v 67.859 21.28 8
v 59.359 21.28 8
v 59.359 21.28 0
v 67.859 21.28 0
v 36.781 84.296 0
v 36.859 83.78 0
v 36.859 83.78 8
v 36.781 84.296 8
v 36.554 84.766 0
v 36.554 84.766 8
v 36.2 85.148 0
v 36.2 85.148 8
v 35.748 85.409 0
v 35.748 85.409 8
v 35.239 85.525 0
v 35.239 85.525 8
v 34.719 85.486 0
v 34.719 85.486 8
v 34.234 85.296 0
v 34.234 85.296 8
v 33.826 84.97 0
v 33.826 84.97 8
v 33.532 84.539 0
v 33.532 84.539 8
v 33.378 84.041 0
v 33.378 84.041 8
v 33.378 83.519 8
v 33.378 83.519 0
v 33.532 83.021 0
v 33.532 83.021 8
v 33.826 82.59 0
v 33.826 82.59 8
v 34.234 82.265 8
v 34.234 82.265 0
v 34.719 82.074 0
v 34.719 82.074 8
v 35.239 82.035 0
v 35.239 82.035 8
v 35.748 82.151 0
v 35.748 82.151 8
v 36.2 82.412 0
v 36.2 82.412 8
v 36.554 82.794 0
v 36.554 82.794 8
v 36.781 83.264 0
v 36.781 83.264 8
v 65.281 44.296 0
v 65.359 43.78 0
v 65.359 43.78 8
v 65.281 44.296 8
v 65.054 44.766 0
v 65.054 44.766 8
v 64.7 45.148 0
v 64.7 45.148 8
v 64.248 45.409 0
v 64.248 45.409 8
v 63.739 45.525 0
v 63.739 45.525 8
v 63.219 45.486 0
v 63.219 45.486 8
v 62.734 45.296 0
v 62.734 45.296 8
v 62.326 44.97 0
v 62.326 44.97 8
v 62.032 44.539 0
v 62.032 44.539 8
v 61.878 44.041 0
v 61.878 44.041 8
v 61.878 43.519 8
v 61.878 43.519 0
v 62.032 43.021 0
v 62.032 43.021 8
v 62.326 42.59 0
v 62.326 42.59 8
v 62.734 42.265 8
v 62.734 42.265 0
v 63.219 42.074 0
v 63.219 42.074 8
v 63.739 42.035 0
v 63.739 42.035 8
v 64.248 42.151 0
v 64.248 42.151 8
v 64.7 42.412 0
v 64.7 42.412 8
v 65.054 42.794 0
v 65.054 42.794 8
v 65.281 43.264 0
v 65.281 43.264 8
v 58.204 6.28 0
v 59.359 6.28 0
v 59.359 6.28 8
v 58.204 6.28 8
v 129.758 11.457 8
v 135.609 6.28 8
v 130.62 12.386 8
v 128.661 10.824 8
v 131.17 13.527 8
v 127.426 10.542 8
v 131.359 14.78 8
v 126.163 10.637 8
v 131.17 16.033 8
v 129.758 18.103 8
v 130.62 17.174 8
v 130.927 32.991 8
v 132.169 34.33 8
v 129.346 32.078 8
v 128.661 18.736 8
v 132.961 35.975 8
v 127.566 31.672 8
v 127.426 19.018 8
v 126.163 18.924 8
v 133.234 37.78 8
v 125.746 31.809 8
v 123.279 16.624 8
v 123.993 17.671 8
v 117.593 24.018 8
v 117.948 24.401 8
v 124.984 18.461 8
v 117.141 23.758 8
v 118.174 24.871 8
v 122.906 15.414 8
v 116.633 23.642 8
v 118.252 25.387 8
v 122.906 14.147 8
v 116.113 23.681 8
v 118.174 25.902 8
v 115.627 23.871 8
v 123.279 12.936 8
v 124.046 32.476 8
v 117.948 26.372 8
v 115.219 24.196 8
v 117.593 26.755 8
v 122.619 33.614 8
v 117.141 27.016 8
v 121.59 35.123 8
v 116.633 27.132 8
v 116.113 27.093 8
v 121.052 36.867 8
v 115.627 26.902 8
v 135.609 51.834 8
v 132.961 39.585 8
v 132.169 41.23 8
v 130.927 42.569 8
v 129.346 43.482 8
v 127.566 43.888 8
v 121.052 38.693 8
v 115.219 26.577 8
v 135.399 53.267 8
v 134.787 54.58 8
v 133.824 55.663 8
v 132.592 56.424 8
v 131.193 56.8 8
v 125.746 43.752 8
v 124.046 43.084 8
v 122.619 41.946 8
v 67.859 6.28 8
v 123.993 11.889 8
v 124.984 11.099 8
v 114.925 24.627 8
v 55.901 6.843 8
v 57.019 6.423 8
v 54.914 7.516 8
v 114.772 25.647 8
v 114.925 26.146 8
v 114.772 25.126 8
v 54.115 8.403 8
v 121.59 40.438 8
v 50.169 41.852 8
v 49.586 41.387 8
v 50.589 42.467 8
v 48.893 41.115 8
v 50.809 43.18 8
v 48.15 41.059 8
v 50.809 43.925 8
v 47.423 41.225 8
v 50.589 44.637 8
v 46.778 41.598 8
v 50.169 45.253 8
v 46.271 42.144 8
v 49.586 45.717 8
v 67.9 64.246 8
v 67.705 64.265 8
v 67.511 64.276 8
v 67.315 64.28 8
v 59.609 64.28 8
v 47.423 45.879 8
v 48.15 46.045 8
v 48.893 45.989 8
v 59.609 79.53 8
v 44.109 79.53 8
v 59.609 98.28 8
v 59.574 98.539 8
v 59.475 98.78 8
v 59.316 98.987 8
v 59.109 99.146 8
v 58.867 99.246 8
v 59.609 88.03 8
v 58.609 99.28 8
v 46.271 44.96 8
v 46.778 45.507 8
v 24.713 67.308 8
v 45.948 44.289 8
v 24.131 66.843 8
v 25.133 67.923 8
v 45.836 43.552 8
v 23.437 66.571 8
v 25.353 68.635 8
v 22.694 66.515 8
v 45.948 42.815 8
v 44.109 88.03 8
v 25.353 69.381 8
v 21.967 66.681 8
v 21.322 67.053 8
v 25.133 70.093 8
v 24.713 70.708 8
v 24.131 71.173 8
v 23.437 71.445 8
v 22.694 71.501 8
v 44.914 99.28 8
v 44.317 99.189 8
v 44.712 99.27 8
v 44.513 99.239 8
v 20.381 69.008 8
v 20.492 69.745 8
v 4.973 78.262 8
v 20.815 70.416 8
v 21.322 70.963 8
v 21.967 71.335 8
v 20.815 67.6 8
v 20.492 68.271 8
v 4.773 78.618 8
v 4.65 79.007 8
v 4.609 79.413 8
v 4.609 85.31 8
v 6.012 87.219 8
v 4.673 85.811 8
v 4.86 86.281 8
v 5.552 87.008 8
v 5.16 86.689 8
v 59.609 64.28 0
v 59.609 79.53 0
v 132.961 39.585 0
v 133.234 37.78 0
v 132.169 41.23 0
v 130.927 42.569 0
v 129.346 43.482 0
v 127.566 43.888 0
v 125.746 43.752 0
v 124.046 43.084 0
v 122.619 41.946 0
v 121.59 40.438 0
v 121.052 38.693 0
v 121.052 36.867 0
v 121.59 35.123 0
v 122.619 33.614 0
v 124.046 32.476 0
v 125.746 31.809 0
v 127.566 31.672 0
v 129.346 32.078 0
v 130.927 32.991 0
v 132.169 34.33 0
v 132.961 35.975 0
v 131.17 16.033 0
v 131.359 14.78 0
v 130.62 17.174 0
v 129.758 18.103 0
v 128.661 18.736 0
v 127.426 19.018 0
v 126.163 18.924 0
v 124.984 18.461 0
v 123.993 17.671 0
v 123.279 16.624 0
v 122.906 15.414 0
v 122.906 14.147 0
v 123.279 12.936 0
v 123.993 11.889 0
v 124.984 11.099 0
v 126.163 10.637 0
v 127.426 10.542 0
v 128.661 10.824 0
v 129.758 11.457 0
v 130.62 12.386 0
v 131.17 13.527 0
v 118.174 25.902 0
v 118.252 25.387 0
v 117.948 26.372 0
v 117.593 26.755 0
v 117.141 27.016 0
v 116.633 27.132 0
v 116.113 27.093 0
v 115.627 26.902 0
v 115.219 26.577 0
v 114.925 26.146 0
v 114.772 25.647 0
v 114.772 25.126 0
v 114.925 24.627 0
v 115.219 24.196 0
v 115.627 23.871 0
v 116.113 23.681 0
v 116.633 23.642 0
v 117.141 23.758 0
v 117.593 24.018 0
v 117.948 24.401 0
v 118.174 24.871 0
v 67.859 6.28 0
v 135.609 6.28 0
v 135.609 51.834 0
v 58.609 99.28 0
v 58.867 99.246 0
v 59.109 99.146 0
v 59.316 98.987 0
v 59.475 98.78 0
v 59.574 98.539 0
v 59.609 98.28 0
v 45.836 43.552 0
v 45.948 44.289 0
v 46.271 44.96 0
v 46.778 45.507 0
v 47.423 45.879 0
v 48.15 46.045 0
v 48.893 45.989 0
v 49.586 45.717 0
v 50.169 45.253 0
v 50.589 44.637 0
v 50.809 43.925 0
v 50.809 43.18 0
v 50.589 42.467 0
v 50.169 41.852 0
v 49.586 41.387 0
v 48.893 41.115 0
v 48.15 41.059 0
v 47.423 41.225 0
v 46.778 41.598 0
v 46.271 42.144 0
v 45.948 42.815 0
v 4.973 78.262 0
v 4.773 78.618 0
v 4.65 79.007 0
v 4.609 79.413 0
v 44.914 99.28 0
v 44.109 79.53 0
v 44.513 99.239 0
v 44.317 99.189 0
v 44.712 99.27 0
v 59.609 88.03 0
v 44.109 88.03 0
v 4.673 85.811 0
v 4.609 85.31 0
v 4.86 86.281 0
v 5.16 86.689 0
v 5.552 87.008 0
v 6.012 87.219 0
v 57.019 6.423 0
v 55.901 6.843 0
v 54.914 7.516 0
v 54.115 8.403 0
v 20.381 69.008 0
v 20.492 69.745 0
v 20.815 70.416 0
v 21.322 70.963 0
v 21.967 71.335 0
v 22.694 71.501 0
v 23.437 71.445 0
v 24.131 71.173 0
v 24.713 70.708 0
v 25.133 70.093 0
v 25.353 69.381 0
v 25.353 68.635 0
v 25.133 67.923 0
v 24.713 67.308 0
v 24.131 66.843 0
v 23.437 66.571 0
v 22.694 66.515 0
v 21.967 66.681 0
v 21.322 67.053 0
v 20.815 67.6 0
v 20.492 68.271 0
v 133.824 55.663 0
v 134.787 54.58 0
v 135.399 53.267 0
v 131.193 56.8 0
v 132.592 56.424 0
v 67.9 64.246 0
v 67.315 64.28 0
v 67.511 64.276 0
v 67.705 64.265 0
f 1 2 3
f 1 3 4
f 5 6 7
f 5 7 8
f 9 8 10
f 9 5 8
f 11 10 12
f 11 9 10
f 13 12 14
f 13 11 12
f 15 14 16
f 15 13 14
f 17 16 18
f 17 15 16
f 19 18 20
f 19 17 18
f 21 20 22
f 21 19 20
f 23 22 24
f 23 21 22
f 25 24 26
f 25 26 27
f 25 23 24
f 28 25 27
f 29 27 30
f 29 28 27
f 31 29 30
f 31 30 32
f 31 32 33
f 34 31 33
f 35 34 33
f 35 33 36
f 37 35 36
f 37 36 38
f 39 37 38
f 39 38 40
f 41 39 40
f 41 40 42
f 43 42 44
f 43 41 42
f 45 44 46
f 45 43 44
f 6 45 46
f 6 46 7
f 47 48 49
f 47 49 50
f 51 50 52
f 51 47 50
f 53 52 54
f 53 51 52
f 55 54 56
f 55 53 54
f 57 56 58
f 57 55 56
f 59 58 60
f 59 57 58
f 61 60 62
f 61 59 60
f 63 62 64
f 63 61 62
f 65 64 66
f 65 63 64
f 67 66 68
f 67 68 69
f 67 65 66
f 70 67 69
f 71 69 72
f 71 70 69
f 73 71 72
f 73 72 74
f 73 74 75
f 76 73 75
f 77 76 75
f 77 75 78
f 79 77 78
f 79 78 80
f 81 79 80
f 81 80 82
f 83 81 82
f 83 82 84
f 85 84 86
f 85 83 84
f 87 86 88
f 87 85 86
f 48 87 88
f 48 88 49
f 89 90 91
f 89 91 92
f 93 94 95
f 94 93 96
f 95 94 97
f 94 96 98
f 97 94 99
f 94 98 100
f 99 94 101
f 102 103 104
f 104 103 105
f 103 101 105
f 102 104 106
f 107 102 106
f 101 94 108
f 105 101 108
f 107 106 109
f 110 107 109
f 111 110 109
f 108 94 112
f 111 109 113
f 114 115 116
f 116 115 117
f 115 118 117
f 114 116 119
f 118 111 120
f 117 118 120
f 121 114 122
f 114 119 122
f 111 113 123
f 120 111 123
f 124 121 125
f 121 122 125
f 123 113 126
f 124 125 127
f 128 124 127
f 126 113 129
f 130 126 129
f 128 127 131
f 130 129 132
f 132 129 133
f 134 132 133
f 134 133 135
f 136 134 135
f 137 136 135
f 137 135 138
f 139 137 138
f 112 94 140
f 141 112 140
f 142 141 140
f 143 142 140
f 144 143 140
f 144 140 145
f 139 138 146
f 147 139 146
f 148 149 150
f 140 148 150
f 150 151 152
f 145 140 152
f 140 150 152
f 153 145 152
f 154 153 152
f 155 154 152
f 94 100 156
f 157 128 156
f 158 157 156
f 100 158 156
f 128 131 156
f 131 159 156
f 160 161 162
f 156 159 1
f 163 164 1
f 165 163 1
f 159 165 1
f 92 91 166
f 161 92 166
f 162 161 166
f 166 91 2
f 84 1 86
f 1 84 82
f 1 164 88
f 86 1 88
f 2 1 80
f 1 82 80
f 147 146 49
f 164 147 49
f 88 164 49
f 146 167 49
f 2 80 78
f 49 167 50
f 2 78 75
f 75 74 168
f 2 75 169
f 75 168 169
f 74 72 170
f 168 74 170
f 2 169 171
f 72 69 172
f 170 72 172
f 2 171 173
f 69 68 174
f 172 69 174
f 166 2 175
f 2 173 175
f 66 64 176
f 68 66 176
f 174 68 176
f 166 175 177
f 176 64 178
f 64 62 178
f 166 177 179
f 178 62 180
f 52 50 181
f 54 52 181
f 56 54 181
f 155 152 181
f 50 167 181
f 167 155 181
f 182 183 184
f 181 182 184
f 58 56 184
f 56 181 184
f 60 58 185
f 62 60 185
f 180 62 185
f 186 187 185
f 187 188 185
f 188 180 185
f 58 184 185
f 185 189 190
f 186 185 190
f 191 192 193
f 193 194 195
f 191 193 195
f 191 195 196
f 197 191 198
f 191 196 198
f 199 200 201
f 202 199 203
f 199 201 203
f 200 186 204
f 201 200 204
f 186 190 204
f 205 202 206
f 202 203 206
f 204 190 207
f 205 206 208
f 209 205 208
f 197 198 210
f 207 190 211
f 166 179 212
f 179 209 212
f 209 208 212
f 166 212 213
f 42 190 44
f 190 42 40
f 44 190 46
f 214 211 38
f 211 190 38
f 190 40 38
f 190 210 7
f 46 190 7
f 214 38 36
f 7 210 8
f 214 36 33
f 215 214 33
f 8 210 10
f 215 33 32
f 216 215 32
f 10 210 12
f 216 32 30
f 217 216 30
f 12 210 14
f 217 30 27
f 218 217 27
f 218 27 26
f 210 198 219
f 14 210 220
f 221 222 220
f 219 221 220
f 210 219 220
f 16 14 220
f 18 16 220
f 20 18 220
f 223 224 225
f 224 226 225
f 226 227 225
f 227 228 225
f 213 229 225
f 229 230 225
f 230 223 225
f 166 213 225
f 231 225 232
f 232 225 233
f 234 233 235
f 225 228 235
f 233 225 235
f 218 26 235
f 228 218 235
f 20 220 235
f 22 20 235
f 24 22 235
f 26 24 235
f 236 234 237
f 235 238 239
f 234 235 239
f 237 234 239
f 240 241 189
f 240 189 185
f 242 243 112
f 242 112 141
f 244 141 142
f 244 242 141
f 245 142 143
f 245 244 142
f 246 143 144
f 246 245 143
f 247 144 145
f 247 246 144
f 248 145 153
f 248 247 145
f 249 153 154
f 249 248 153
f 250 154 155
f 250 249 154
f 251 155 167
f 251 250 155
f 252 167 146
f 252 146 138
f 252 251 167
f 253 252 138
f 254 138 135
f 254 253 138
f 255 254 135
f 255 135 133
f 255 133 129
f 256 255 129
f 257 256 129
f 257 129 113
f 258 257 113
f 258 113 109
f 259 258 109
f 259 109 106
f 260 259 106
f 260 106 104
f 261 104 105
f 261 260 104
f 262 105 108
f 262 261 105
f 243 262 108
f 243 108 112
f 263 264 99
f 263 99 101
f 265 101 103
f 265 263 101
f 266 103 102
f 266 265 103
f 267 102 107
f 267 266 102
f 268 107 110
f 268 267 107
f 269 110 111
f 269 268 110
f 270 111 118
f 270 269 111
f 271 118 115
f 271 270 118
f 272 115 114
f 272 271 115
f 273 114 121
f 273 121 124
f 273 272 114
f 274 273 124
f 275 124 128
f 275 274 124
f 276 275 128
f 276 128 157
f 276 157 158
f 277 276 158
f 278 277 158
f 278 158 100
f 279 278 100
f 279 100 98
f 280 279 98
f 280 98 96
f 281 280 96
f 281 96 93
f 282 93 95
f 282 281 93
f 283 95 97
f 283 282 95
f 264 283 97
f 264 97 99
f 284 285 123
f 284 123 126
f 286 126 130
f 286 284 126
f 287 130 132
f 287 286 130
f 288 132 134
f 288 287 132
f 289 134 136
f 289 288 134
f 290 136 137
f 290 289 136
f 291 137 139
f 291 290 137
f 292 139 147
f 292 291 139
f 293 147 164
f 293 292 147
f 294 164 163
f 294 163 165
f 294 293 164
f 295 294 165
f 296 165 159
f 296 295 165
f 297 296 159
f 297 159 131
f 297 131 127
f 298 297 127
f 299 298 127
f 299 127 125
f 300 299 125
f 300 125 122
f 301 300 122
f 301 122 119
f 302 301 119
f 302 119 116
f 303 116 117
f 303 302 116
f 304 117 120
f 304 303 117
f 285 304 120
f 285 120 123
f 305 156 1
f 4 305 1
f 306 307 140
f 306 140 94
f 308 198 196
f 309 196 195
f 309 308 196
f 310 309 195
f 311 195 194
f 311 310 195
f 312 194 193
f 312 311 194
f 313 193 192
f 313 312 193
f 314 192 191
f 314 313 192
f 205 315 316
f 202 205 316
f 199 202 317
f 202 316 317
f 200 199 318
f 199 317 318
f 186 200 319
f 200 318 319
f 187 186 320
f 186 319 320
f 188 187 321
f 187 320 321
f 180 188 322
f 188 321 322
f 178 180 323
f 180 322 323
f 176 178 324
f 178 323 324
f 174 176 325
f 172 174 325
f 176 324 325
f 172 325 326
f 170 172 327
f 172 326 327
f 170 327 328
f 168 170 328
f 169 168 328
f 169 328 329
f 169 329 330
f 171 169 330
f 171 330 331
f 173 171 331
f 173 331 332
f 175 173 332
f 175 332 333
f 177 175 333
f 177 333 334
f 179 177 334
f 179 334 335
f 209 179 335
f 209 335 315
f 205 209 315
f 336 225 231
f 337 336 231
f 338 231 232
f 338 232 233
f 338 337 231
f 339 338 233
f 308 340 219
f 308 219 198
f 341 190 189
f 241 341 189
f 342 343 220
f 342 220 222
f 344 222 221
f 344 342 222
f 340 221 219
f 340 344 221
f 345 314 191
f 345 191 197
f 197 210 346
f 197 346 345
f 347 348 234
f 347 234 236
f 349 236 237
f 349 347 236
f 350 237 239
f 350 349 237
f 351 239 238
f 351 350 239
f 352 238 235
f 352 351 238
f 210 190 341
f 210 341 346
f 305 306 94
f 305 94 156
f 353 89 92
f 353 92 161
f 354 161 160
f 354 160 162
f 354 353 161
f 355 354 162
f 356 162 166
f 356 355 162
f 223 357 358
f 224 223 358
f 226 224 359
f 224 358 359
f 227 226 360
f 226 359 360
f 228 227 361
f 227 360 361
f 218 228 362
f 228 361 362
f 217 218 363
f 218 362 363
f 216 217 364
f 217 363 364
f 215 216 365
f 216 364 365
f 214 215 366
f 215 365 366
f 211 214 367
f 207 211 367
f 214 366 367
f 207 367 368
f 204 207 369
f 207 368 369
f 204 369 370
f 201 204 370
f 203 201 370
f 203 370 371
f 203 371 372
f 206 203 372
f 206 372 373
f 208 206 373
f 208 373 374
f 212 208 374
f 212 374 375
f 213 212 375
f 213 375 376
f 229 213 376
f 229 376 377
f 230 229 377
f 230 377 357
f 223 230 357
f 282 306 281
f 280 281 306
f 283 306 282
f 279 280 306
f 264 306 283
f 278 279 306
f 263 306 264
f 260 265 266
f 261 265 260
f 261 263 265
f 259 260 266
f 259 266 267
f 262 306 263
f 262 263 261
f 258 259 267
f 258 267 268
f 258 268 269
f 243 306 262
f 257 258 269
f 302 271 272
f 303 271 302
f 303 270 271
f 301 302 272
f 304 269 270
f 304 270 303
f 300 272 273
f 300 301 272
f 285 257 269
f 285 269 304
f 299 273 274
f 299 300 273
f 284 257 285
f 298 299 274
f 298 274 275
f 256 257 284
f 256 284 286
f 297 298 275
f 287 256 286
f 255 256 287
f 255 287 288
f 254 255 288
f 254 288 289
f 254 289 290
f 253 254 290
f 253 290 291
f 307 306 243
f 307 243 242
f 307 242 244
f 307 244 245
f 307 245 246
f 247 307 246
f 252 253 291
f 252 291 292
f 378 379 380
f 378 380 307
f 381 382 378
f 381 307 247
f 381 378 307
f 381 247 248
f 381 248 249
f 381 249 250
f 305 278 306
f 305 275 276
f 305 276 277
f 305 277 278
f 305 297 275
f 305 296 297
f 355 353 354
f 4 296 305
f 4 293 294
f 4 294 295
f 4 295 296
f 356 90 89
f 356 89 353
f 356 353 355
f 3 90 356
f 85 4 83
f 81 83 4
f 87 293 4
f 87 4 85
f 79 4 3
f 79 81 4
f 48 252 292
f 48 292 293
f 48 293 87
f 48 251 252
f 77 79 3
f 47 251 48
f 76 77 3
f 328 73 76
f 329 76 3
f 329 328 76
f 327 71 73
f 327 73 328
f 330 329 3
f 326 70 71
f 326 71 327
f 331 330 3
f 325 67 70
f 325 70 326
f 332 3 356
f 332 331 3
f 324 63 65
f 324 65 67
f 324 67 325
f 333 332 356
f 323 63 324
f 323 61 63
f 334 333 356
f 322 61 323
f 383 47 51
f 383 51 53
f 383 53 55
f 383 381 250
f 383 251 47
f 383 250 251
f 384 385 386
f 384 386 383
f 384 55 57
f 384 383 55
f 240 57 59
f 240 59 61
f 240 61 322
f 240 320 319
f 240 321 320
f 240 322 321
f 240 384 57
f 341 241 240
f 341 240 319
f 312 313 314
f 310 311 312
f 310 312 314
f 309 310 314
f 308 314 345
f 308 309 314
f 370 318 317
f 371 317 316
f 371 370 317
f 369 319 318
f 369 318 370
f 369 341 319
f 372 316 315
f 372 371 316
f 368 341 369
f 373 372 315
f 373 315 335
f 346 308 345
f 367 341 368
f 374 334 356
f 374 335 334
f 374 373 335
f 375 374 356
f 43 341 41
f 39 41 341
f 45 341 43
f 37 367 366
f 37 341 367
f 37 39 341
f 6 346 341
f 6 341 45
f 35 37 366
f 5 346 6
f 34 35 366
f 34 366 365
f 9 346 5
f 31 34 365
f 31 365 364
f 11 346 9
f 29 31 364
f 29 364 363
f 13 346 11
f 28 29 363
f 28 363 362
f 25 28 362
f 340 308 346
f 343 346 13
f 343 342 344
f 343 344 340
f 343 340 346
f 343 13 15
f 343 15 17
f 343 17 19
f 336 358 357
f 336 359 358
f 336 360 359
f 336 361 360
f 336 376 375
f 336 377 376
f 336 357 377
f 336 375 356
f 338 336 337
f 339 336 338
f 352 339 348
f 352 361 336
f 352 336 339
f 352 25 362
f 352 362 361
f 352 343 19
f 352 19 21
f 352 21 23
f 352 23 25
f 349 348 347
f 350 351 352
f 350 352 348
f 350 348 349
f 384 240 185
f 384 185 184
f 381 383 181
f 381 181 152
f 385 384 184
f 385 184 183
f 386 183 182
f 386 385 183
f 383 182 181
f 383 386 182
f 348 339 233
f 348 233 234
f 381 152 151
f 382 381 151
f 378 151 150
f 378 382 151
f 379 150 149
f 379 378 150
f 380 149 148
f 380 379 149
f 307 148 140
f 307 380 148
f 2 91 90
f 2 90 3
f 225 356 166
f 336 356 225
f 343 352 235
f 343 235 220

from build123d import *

# Parameters (mm, degrees)
SKETCH2_R          = 6.125
SKETCH2_R_2        = 4.25
SKETCH2_R_3        = 1.75
EXTRUDE1_DEPTH     = 8
SKETCH3_W          = 8.5
SKETCH3_H          = 15
SKETCH3_W_2        = 15.5
SKETCH3_H_2        = 8.5
EXTRUDE2_DEPTH     = 10
SKETCH4_R          = 2.5
CUT_EXTRUDE1_DEPTH = 169.256392057


with BuildPart() as part:
    # Sketch2 → Extrude1 (new body)
    with BuildSketch(Plane.XY):
        with BuildLine():
            Line((59.608556798, 87.780072478), (59.608556798, 79.780072478))
            Line((59.608556798, 79.780072478), (59.608556798, 64.280072478))
            Line((59.608556798, 64.280072478), (67.315449876, 64.280072478))
            ThreePointArc((67.315449876, 64.280072478), (67.608054466, 64.27150339), (67.899656114, 64.2458255))
            Line((67.899656114, 64.2458255), (131.192763036, 56.799577626))
            ThreePointArc((131.192763036, 56.799577626), (134.344934134, 55.156396561), (135.608556798, 51.833824605))
            Line((135.608556798, 51.833824605), (135.608556798, 6.280072478))
            Line((135.608556798, 6.280072478), (67.608556798, 6.280072478))
            Line((67.608556798, 6.280072478), (59.608556798, 6.280072478))
            Line((59.608556798, 6.280072478), (58.204496826, 6.280072478))
            ThreePointArc((58.204496826, 6.280072478), (55.900569943, 6.842514488), (54.114973167, 8.403304111))
            Line((54.114973167, 8.403304111), (4.972747334, 78.262350637))
            ThreePointArc((4.972747334, 78.262350637), (4.70177693, 78.809575974), (4.608556798, 79.413057984))
            Line((4.608556798, 79.413057984), (4.608556798, 85.309690651))
            ThreePointArc((4.608556798, 85.309690651), (4.997175407, 86.494363608), (6.012006812, 87.218650607))
            Line((6.012006812, 87.218650607), (44.317228657, 99.189032434))
            ThreePointArc((44.317228657, 99.189032434), (44.612050216, 99.257181467), (44.913778644, 99.280072478))
            Line((44.913778644, 99.280072478), (58.608556798, 99.280072478))
            ThreePointArc((58.608556798, 99.280072478), (59.315663579, 98.987179259), (59.608556798, 98.280072478))
            Line((59.608556798, 98.280072478), (59.608556798, 87.780072478))
        make_face()
        with Locations((127.108556798, 37.780072478)):
            Circle(SKETCH2_R, mode=Mode.SUBTRACT)
        with Locations((127.108556798, 14.780072478)):
            Circle(SKETCH2_R_2, mode=Mode.SUBTRACT)
        with Locations((116.501954798, 25.386674196)):
            Circle(SKETCH2_R_3, mode=Mode.SUBTRACT)
        with Locations((63.608556798, 43.780072478)):
            Circle(SKETCH2_R_3, mode=Mode.SUBTRACT)
        with Locations((35.108556798, 83.780072478)):
            Circle(SKETCH2_R_3, mode=Mode.SUBTRACT)
    extrude(amount=EXTRUDE1_DEPTH)

    # Sketch3 → Extrude2 (cut)
    with BuildSketch(Plane.XY.offset(8)):
        with Locations((63.608556798, 13.780072478)):
            Rectangle(SKETCH3_W, SKETCH3_H)
        with Locations((51.858556798, 83.780072478)):
            Rectangle(SKETCH3_W_2, SKETCH3_H_2)
    extrude(amount=-EXTRUDE2_DEPTH, mode=Mode.SUBTRACT)

    # Sketch4 → Cut-Extrude1 (cut, through all)
    with BuildSketch(Plane(origin=(0, 0, 0), x_dir=(-1, 0, 0), z_dir=(0, 0, -1))):
        with Locations((-22.880634737, 69.007994539)):
            Circle(SKETCH4_R)
        with Locations((-48.336478859, 43.552150417)):
            Circle(SKETCH4_R)
    extrude(amount=-CUT_EXTRUDE1_DEPTH, mode=Mode.SUBTRACT)


solid = part.part
